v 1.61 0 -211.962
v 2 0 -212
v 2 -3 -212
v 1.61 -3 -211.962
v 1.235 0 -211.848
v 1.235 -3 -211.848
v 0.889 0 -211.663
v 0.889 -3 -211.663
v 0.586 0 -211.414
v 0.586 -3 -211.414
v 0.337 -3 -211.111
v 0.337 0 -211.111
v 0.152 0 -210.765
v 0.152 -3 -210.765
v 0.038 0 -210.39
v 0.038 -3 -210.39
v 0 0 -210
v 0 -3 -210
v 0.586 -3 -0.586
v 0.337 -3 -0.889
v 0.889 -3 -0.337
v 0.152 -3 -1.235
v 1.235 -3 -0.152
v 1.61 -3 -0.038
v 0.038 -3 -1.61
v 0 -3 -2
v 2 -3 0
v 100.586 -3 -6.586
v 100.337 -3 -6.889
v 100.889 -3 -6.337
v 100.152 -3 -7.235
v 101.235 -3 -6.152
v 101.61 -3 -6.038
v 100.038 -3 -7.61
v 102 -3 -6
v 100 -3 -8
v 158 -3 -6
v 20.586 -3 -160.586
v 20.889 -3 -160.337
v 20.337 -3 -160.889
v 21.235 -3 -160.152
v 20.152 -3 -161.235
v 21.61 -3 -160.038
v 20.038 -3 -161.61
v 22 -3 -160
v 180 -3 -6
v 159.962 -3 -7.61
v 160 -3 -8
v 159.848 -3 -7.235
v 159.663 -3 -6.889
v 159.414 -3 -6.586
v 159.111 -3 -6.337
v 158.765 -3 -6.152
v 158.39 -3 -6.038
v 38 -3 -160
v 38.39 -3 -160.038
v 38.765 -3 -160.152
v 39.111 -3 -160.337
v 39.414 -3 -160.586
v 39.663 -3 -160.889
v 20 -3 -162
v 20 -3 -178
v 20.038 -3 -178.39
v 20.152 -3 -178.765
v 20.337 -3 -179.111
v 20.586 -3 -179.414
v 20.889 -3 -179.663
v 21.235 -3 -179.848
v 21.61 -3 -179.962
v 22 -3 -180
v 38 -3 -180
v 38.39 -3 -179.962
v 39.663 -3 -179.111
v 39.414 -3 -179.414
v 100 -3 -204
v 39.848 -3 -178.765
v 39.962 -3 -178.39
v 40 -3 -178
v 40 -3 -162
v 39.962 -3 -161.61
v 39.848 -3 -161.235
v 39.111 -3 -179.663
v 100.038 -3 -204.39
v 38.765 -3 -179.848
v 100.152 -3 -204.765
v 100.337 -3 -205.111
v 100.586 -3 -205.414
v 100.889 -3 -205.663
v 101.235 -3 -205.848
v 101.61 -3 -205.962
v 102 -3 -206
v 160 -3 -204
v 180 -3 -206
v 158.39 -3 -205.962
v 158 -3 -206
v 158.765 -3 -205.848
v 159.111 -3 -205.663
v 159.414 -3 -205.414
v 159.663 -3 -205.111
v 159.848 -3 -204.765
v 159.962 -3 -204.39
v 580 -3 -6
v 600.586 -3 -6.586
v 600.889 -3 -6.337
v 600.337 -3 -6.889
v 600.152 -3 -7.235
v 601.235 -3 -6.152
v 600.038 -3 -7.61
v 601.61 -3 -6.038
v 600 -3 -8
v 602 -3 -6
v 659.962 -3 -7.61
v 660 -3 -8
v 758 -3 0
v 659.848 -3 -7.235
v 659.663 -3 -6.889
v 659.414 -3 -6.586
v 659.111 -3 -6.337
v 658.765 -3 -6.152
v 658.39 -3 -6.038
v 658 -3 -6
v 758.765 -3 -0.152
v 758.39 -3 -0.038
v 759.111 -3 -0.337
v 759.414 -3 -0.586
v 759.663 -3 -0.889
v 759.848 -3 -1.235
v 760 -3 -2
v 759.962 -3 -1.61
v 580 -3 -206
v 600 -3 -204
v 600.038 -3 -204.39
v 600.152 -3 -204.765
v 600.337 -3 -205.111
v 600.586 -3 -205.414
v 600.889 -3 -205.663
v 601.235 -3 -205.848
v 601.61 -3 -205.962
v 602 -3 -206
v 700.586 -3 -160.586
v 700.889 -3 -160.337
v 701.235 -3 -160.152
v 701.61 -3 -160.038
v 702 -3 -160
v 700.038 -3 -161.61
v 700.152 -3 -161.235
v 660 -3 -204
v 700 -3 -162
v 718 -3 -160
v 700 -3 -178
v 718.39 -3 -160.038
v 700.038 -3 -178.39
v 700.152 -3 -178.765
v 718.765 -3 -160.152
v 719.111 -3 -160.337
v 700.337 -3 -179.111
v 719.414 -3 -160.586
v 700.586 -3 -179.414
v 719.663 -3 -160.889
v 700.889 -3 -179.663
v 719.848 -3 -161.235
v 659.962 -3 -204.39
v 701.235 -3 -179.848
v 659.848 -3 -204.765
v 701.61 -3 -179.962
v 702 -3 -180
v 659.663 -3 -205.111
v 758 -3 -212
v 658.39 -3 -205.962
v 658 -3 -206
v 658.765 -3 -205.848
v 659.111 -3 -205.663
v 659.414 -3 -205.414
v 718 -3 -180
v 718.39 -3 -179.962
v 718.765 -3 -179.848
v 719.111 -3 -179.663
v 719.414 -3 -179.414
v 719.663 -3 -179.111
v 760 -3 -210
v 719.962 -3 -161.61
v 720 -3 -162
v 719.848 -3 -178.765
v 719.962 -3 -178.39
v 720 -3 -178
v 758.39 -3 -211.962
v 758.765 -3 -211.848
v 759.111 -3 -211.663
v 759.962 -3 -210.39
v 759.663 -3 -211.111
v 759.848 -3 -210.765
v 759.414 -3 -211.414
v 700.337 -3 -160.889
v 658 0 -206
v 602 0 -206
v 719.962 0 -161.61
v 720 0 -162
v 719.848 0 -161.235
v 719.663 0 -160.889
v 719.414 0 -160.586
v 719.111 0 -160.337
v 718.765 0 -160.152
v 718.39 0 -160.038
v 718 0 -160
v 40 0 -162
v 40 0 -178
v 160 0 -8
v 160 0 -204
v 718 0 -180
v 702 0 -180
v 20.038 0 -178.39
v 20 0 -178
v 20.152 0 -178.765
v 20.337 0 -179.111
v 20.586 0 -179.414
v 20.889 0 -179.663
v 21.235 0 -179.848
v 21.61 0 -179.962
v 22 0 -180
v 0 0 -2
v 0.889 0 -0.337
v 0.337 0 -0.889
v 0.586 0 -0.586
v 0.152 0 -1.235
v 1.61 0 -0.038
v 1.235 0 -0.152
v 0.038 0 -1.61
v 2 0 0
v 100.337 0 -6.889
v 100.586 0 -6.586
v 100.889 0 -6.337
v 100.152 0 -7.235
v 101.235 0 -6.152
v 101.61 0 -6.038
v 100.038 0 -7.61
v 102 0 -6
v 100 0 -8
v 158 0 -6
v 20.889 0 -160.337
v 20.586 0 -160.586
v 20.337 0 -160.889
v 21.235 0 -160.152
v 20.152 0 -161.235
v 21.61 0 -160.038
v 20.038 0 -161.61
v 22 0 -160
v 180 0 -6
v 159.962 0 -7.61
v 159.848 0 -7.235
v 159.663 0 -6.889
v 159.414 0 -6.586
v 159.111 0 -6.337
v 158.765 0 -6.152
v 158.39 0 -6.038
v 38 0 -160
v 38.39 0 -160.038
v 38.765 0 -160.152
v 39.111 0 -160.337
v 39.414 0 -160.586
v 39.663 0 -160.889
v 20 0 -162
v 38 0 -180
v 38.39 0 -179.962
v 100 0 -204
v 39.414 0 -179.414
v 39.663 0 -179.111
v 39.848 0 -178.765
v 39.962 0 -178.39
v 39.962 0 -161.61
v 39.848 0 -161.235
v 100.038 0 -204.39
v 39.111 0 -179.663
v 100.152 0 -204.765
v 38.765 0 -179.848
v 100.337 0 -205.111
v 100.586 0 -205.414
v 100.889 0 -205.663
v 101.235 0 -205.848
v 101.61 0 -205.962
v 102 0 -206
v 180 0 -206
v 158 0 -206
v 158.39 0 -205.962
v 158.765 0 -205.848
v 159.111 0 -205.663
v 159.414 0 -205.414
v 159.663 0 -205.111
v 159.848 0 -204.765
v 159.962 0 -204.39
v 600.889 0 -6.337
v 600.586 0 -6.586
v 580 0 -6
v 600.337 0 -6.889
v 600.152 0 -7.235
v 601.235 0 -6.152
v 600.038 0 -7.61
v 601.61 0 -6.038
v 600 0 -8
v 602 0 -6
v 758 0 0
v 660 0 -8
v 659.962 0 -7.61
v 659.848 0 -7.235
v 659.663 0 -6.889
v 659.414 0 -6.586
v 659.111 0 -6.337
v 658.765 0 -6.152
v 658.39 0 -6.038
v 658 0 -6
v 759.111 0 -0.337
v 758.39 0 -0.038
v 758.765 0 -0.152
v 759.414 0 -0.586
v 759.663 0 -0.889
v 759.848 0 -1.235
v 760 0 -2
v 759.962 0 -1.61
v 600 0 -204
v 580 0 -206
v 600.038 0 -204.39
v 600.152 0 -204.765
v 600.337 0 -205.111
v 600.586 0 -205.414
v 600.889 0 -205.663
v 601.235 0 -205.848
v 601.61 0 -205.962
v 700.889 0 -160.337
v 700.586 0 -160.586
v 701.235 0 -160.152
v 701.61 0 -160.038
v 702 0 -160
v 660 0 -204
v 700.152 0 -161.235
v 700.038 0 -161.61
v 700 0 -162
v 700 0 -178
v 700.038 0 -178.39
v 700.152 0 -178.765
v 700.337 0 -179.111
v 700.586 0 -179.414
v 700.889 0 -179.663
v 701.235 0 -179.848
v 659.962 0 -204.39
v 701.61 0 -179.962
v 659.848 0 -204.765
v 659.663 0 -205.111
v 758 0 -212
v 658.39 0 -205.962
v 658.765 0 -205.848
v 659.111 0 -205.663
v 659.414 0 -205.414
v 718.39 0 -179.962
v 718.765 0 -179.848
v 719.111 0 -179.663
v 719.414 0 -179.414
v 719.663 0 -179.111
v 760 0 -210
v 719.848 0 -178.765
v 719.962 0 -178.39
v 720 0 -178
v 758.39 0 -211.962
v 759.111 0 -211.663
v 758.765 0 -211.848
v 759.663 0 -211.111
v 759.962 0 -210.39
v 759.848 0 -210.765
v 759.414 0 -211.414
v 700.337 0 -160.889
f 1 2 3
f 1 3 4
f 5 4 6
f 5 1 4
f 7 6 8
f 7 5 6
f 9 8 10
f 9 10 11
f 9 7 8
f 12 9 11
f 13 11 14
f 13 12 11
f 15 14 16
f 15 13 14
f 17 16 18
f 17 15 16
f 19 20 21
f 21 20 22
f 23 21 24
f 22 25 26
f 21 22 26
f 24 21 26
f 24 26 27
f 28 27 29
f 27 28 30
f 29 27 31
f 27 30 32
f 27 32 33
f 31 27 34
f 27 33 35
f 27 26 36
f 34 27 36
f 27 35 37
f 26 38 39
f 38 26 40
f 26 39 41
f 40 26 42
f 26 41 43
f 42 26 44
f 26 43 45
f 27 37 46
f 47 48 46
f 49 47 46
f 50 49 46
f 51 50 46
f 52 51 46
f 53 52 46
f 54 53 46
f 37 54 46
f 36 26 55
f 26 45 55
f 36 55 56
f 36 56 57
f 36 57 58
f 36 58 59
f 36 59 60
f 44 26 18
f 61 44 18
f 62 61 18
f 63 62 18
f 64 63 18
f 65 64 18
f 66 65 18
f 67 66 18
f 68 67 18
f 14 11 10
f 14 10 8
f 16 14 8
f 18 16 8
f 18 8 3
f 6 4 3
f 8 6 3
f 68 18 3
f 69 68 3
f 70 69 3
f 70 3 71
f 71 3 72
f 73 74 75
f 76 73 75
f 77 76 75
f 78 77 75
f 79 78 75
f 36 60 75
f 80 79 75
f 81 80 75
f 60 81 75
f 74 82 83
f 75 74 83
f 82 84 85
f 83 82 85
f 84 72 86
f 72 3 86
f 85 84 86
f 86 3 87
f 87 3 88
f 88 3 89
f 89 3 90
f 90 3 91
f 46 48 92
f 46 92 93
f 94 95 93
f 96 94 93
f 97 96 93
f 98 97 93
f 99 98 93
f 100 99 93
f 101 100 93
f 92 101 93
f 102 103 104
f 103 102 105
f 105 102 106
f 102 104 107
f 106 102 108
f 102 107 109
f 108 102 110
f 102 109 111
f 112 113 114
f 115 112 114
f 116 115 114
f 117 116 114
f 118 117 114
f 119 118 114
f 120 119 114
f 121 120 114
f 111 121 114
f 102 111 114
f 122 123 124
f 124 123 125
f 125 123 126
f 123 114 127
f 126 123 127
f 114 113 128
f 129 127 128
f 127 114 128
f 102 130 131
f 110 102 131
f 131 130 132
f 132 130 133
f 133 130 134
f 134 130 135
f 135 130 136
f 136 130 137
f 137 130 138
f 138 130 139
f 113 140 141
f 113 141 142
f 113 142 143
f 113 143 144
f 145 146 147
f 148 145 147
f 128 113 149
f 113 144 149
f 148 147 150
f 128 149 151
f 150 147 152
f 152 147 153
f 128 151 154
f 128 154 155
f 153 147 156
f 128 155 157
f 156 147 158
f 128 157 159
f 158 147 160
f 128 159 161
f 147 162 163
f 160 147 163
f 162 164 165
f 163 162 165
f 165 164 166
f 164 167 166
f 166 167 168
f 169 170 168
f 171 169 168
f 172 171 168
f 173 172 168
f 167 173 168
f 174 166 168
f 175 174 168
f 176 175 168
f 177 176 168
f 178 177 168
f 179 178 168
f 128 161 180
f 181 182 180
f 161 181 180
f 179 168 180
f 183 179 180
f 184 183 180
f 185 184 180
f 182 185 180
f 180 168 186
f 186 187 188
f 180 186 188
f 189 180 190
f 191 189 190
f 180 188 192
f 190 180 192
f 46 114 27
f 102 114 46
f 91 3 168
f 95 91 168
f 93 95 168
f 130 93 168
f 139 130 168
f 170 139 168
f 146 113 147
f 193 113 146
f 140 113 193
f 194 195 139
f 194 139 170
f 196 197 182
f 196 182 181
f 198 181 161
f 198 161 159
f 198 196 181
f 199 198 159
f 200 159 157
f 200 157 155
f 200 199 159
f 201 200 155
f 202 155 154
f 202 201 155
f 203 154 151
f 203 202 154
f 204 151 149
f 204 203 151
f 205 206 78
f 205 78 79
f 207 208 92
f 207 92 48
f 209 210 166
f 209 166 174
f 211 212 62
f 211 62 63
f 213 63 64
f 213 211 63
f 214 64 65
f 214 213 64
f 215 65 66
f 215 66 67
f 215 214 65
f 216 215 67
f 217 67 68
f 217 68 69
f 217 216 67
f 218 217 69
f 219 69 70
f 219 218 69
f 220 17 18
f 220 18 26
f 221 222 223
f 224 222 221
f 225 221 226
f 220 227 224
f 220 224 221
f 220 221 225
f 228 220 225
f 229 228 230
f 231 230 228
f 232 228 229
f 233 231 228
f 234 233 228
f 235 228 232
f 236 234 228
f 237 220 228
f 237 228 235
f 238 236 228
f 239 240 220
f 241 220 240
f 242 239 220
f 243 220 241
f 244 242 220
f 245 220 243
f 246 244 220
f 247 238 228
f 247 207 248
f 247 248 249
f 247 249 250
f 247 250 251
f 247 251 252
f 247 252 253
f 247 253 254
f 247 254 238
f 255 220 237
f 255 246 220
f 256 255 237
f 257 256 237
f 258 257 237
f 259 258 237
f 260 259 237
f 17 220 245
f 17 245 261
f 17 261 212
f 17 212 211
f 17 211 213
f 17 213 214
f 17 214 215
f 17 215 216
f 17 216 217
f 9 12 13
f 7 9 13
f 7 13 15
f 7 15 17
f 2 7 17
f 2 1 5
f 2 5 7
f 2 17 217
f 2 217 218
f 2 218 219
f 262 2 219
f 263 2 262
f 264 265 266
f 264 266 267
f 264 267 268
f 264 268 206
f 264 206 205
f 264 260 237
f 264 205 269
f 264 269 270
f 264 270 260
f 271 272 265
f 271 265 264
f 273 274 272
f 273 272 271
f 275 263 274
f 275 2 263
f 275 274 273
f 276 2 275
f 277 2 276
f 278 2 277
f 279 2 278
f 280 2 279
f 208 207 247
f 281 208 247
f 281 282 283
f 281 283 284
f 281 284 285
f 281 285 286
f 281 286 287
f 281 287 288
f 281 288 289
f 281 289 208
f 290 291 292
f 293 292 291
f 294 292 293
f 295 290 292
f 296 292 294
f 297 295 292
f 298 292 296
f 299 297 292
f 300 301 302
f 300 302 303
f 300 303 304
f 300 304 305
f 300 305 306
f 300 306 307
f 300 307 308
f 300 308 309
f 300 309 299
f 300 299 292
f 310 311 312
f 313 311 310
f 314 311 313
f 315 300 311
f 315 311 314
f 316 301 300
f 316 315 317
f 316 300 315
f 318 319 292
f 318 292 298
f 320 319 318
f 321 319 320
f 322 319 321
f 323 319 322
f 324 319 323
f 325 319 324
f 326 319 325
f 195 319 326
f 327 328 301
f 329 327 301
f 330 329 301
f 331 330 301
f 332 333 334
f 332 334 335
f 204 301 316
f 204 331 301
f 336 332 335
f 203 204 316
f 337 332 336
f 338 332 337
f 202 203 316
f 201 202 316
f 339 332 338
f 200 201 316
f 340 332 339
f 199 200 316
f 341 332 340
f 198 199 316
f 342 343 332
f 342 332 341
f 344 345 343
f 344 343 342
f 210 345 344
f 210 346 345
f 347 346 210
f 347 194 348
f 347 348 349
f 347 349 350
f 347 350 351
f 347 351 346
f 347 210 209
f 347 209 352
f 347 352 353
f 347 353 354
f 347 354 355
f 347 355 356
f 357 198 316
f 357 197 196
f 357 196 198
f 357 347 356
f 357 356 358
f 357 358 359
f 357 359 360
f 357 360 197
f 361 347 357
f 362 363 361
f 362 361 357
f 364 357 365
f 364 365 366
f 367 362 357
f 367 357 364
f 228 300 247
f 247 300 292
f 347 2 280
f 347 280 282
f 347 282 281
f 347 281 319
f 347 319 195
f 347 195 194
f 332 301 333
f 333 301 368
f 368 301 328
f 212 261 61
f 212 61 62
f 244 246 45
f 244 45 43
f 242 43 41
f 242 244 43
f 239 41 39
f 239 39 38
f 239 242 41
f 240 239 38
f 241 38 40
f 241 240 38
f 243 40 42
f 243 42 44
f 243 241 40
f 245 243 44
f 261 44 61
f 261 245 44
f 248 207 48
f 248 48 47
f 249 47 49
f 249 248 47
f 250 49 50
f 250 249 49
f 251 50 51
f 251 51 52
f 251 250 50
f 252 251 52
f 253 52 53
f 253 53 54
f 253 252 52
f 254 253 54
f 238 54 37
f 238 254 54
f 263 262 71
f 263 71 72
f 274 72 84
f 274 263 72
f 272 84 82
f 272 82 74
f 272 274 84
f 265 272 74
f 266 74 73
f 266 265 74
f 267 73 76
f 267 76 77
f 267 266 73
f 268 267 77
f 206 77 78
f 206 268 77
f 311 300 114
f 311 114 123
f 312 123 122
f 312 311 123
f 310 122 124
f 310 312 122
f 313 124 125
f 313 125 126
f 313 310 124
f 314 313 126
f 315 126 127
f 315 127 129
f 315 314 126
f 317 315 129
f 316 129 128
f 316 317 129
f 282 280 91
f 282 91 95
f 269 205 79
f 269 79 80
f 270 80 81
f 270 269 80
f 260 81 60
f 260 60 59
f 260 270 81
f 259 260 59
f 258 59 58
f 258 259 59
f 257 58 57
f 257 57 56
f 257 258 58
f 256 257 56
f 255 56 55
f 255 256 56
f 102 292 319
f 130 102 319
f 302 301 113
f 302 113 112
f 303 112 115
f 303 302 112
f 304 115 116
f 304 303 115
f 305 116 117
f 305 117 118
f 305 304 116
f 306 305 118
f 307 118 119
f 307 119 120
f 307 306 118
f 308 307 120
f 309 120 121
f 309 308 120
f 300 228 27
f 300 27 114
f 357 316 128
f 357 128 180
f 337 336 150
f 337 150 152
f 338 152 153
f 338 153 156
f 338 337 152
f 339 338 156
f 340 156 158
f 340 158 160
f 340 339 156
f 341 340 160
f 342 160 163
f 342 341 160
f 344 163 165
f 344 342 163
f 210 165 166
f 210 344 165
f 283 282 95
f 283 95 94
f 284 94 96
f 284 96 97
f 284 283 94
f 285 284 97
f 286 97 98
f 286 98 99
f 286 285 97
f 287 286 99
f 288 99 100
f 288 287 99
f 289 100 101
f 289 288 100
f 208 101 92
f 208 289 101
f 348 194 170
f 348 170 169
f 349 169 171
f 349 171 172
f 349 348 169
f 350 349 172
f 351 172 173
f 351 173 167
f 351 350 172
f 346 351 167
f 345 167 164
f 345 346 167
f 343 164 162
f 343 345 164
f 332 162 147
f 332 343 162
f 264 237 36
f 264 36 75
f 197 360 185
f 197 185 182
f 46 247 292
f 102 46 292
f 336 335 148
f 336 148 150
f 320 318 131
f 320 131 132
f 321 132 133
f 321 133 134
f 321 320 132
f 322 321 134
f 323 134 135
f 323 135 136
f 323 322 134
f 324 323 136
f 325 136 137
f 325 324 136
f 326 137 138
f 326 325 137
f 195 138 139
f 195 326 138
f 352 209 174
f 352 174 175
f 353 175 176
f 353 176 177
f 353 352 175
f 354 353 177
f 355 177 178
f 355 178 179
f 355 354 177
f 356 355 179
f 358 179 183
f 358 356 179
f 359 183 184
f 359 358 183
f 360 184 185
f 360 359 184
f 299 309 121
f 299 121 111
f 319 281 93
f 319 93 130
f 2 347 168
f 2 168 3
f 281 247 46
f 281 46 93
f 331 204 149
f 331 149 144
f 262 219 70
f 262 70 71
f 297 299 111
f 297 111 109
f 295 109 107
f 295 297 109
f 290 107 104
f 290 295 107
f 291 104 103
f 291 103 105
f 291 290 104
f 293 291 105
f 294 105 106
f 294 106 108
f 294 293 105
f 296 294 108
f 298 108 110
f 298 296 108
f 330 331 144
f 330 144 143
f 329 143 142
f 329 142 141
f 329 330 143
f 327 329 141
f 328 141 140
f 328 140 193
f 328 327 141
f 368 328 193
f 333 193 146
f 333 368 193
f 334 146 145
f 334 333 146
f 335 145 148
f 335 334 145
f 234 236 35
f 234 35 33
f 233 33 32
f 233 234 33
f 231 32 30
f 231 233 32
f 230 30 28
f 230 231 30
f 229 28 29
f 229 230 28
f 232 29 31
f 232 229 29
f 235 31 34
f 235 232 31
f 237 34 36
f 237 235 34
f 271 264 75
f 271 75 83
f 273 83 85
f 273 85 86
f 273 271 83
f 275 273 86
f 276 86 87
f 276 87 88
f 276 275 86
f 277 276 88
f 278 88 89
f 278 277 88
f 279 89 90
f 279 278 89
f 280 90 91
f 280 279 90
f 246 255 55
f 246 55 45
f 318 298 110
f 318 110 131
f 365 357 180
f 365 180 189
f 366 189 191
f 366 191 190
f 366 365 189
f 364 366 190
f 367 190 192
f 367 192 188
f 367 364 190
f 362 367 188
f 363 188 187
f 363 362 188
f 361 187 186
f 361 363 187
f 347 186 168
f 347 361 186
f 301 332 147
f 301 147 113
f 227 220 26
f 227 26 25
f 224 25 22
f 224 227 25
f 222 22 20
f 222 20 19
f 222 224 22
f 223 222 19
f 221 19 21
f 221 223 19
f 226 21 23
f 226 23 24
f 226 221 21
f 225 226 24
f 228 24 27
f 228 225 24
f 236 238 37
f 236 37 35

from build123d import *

# Parameters (mm, degrees)
SKETCH_1_W      = 400
SKETCH_1_H      = 200
EXTRUDE_1_DEPTH = 3


with BuildPart() as part:
    # 草图1 → 凸台-拉伸1 (new body)
    with BuildSketch(Plane(origin=(0, 0, 0), x_dir=(1, 0, 0), z_dir=(0, 1, 0))):
        with BuildLine():
            Line((2, 0), (758, 0))
            ThreePointArc((758, 0), (759.414213562, 0.585786438), (760, 2))
            Line((760, 2), (760, 210))
            ThreePointArc((760, 210), (759.414213562, 211.414213562), (758, 212))
            Line((758, 212), (2, 212))
            ThreePointArc((2, 212), (0.585786438, 211.414213562), (0, 210))
            Line((0, 210), (0, 2))
            ThreePointArc((0, 2), (0.585786438, 0.585786438), (2, 0))
        make_face()
        with Locations((380, 106)):
            Rectangle(SKETCH_1_W, SKETCH_1_H, mode=Mode.SUBTRACT)
        with BuildLine():
            Line((658, 6), (602, 6))
            ThreePointArc((602, 6), (600.585786438, 6.585786438), (600, 8))
            Line((600, 8), (600, 204))
            ThreePointArc((600, 204), (600.585786438, 205.414213562), (602, 206))
            Line((602, 206), (658, 206))
            ThreePointArc((658, 206), (659.414213562, 205.414213562), (660, 204))
            Line((660, 204), (660, 8))
            ThreePointArc((660, 8), (659.414213562, 6.585786438), (658, 6))
        make_face(mode=Mode.SUBTRACT)
        with BuildLine():
            Line((158, 6), (102, 6))
            ThreePointArc((102, 6), (100.585786438, 6.585786438), (100, 8))
            Line((100, 8), (100, 204))
            ThreePointArc((100, 204), (100.585786438, 205.414213562), (102, 206))
            Line((102, 206), (158, 206))
            ThreePointArc((158, 206), (159.414213562, 205.414213562), (160, 204))
            Line((160, 204), (160, 8))
            ThreePointArc((160, 8), (159.414213562, 6.585786438), (158, 6))
        make_face(mode=Mode.SUBTRACT)
        with BuildLine():
            Line((38, 160), (22, 160))
            ThreePointArc((22, 160), (20.585786438, 160.585786438), (20, 162))
            Line((20, 162), (20, 178))
            ThreePointArc((20, 178), (20.585786438, 179.414213562), (22, 180))
            Line((22, 180), (38, 180))
            ThreePointArc((38, 180), (39.414213562, 179.414213562), (40, 178))
            Line((40, 178), (40, 162))
            ThreePointArc((40, 162), (39.414213562, 160.585786438), (38, 160))
        make_face(mode=Mode.SUBTRACT)
        with BuildLine():
            Line((718, 160), (702, 160))
            ThreePointArc((702, 160), (700.585786438, 160.585786438), (700, 162))
            Line((700, 162), (700, 178))
            ThreePointArc((700, 178), (700.585786438, 179.414213562), (702, 180))
            Line((702, 180), (718, 180))
            ThreePointArc((718, 180), (719.414213562, 179.414213562), (720, 178))
            Line((720, 178), (720, 162))
            ThreePointArc((720, 162), (719.414213562, 160.585786438), (718, 160))
        make_face(mode=Mode.SUBTRACT)
    extrude(amount=-EXTRUDE_1_DEPTH)


solid = part.part
